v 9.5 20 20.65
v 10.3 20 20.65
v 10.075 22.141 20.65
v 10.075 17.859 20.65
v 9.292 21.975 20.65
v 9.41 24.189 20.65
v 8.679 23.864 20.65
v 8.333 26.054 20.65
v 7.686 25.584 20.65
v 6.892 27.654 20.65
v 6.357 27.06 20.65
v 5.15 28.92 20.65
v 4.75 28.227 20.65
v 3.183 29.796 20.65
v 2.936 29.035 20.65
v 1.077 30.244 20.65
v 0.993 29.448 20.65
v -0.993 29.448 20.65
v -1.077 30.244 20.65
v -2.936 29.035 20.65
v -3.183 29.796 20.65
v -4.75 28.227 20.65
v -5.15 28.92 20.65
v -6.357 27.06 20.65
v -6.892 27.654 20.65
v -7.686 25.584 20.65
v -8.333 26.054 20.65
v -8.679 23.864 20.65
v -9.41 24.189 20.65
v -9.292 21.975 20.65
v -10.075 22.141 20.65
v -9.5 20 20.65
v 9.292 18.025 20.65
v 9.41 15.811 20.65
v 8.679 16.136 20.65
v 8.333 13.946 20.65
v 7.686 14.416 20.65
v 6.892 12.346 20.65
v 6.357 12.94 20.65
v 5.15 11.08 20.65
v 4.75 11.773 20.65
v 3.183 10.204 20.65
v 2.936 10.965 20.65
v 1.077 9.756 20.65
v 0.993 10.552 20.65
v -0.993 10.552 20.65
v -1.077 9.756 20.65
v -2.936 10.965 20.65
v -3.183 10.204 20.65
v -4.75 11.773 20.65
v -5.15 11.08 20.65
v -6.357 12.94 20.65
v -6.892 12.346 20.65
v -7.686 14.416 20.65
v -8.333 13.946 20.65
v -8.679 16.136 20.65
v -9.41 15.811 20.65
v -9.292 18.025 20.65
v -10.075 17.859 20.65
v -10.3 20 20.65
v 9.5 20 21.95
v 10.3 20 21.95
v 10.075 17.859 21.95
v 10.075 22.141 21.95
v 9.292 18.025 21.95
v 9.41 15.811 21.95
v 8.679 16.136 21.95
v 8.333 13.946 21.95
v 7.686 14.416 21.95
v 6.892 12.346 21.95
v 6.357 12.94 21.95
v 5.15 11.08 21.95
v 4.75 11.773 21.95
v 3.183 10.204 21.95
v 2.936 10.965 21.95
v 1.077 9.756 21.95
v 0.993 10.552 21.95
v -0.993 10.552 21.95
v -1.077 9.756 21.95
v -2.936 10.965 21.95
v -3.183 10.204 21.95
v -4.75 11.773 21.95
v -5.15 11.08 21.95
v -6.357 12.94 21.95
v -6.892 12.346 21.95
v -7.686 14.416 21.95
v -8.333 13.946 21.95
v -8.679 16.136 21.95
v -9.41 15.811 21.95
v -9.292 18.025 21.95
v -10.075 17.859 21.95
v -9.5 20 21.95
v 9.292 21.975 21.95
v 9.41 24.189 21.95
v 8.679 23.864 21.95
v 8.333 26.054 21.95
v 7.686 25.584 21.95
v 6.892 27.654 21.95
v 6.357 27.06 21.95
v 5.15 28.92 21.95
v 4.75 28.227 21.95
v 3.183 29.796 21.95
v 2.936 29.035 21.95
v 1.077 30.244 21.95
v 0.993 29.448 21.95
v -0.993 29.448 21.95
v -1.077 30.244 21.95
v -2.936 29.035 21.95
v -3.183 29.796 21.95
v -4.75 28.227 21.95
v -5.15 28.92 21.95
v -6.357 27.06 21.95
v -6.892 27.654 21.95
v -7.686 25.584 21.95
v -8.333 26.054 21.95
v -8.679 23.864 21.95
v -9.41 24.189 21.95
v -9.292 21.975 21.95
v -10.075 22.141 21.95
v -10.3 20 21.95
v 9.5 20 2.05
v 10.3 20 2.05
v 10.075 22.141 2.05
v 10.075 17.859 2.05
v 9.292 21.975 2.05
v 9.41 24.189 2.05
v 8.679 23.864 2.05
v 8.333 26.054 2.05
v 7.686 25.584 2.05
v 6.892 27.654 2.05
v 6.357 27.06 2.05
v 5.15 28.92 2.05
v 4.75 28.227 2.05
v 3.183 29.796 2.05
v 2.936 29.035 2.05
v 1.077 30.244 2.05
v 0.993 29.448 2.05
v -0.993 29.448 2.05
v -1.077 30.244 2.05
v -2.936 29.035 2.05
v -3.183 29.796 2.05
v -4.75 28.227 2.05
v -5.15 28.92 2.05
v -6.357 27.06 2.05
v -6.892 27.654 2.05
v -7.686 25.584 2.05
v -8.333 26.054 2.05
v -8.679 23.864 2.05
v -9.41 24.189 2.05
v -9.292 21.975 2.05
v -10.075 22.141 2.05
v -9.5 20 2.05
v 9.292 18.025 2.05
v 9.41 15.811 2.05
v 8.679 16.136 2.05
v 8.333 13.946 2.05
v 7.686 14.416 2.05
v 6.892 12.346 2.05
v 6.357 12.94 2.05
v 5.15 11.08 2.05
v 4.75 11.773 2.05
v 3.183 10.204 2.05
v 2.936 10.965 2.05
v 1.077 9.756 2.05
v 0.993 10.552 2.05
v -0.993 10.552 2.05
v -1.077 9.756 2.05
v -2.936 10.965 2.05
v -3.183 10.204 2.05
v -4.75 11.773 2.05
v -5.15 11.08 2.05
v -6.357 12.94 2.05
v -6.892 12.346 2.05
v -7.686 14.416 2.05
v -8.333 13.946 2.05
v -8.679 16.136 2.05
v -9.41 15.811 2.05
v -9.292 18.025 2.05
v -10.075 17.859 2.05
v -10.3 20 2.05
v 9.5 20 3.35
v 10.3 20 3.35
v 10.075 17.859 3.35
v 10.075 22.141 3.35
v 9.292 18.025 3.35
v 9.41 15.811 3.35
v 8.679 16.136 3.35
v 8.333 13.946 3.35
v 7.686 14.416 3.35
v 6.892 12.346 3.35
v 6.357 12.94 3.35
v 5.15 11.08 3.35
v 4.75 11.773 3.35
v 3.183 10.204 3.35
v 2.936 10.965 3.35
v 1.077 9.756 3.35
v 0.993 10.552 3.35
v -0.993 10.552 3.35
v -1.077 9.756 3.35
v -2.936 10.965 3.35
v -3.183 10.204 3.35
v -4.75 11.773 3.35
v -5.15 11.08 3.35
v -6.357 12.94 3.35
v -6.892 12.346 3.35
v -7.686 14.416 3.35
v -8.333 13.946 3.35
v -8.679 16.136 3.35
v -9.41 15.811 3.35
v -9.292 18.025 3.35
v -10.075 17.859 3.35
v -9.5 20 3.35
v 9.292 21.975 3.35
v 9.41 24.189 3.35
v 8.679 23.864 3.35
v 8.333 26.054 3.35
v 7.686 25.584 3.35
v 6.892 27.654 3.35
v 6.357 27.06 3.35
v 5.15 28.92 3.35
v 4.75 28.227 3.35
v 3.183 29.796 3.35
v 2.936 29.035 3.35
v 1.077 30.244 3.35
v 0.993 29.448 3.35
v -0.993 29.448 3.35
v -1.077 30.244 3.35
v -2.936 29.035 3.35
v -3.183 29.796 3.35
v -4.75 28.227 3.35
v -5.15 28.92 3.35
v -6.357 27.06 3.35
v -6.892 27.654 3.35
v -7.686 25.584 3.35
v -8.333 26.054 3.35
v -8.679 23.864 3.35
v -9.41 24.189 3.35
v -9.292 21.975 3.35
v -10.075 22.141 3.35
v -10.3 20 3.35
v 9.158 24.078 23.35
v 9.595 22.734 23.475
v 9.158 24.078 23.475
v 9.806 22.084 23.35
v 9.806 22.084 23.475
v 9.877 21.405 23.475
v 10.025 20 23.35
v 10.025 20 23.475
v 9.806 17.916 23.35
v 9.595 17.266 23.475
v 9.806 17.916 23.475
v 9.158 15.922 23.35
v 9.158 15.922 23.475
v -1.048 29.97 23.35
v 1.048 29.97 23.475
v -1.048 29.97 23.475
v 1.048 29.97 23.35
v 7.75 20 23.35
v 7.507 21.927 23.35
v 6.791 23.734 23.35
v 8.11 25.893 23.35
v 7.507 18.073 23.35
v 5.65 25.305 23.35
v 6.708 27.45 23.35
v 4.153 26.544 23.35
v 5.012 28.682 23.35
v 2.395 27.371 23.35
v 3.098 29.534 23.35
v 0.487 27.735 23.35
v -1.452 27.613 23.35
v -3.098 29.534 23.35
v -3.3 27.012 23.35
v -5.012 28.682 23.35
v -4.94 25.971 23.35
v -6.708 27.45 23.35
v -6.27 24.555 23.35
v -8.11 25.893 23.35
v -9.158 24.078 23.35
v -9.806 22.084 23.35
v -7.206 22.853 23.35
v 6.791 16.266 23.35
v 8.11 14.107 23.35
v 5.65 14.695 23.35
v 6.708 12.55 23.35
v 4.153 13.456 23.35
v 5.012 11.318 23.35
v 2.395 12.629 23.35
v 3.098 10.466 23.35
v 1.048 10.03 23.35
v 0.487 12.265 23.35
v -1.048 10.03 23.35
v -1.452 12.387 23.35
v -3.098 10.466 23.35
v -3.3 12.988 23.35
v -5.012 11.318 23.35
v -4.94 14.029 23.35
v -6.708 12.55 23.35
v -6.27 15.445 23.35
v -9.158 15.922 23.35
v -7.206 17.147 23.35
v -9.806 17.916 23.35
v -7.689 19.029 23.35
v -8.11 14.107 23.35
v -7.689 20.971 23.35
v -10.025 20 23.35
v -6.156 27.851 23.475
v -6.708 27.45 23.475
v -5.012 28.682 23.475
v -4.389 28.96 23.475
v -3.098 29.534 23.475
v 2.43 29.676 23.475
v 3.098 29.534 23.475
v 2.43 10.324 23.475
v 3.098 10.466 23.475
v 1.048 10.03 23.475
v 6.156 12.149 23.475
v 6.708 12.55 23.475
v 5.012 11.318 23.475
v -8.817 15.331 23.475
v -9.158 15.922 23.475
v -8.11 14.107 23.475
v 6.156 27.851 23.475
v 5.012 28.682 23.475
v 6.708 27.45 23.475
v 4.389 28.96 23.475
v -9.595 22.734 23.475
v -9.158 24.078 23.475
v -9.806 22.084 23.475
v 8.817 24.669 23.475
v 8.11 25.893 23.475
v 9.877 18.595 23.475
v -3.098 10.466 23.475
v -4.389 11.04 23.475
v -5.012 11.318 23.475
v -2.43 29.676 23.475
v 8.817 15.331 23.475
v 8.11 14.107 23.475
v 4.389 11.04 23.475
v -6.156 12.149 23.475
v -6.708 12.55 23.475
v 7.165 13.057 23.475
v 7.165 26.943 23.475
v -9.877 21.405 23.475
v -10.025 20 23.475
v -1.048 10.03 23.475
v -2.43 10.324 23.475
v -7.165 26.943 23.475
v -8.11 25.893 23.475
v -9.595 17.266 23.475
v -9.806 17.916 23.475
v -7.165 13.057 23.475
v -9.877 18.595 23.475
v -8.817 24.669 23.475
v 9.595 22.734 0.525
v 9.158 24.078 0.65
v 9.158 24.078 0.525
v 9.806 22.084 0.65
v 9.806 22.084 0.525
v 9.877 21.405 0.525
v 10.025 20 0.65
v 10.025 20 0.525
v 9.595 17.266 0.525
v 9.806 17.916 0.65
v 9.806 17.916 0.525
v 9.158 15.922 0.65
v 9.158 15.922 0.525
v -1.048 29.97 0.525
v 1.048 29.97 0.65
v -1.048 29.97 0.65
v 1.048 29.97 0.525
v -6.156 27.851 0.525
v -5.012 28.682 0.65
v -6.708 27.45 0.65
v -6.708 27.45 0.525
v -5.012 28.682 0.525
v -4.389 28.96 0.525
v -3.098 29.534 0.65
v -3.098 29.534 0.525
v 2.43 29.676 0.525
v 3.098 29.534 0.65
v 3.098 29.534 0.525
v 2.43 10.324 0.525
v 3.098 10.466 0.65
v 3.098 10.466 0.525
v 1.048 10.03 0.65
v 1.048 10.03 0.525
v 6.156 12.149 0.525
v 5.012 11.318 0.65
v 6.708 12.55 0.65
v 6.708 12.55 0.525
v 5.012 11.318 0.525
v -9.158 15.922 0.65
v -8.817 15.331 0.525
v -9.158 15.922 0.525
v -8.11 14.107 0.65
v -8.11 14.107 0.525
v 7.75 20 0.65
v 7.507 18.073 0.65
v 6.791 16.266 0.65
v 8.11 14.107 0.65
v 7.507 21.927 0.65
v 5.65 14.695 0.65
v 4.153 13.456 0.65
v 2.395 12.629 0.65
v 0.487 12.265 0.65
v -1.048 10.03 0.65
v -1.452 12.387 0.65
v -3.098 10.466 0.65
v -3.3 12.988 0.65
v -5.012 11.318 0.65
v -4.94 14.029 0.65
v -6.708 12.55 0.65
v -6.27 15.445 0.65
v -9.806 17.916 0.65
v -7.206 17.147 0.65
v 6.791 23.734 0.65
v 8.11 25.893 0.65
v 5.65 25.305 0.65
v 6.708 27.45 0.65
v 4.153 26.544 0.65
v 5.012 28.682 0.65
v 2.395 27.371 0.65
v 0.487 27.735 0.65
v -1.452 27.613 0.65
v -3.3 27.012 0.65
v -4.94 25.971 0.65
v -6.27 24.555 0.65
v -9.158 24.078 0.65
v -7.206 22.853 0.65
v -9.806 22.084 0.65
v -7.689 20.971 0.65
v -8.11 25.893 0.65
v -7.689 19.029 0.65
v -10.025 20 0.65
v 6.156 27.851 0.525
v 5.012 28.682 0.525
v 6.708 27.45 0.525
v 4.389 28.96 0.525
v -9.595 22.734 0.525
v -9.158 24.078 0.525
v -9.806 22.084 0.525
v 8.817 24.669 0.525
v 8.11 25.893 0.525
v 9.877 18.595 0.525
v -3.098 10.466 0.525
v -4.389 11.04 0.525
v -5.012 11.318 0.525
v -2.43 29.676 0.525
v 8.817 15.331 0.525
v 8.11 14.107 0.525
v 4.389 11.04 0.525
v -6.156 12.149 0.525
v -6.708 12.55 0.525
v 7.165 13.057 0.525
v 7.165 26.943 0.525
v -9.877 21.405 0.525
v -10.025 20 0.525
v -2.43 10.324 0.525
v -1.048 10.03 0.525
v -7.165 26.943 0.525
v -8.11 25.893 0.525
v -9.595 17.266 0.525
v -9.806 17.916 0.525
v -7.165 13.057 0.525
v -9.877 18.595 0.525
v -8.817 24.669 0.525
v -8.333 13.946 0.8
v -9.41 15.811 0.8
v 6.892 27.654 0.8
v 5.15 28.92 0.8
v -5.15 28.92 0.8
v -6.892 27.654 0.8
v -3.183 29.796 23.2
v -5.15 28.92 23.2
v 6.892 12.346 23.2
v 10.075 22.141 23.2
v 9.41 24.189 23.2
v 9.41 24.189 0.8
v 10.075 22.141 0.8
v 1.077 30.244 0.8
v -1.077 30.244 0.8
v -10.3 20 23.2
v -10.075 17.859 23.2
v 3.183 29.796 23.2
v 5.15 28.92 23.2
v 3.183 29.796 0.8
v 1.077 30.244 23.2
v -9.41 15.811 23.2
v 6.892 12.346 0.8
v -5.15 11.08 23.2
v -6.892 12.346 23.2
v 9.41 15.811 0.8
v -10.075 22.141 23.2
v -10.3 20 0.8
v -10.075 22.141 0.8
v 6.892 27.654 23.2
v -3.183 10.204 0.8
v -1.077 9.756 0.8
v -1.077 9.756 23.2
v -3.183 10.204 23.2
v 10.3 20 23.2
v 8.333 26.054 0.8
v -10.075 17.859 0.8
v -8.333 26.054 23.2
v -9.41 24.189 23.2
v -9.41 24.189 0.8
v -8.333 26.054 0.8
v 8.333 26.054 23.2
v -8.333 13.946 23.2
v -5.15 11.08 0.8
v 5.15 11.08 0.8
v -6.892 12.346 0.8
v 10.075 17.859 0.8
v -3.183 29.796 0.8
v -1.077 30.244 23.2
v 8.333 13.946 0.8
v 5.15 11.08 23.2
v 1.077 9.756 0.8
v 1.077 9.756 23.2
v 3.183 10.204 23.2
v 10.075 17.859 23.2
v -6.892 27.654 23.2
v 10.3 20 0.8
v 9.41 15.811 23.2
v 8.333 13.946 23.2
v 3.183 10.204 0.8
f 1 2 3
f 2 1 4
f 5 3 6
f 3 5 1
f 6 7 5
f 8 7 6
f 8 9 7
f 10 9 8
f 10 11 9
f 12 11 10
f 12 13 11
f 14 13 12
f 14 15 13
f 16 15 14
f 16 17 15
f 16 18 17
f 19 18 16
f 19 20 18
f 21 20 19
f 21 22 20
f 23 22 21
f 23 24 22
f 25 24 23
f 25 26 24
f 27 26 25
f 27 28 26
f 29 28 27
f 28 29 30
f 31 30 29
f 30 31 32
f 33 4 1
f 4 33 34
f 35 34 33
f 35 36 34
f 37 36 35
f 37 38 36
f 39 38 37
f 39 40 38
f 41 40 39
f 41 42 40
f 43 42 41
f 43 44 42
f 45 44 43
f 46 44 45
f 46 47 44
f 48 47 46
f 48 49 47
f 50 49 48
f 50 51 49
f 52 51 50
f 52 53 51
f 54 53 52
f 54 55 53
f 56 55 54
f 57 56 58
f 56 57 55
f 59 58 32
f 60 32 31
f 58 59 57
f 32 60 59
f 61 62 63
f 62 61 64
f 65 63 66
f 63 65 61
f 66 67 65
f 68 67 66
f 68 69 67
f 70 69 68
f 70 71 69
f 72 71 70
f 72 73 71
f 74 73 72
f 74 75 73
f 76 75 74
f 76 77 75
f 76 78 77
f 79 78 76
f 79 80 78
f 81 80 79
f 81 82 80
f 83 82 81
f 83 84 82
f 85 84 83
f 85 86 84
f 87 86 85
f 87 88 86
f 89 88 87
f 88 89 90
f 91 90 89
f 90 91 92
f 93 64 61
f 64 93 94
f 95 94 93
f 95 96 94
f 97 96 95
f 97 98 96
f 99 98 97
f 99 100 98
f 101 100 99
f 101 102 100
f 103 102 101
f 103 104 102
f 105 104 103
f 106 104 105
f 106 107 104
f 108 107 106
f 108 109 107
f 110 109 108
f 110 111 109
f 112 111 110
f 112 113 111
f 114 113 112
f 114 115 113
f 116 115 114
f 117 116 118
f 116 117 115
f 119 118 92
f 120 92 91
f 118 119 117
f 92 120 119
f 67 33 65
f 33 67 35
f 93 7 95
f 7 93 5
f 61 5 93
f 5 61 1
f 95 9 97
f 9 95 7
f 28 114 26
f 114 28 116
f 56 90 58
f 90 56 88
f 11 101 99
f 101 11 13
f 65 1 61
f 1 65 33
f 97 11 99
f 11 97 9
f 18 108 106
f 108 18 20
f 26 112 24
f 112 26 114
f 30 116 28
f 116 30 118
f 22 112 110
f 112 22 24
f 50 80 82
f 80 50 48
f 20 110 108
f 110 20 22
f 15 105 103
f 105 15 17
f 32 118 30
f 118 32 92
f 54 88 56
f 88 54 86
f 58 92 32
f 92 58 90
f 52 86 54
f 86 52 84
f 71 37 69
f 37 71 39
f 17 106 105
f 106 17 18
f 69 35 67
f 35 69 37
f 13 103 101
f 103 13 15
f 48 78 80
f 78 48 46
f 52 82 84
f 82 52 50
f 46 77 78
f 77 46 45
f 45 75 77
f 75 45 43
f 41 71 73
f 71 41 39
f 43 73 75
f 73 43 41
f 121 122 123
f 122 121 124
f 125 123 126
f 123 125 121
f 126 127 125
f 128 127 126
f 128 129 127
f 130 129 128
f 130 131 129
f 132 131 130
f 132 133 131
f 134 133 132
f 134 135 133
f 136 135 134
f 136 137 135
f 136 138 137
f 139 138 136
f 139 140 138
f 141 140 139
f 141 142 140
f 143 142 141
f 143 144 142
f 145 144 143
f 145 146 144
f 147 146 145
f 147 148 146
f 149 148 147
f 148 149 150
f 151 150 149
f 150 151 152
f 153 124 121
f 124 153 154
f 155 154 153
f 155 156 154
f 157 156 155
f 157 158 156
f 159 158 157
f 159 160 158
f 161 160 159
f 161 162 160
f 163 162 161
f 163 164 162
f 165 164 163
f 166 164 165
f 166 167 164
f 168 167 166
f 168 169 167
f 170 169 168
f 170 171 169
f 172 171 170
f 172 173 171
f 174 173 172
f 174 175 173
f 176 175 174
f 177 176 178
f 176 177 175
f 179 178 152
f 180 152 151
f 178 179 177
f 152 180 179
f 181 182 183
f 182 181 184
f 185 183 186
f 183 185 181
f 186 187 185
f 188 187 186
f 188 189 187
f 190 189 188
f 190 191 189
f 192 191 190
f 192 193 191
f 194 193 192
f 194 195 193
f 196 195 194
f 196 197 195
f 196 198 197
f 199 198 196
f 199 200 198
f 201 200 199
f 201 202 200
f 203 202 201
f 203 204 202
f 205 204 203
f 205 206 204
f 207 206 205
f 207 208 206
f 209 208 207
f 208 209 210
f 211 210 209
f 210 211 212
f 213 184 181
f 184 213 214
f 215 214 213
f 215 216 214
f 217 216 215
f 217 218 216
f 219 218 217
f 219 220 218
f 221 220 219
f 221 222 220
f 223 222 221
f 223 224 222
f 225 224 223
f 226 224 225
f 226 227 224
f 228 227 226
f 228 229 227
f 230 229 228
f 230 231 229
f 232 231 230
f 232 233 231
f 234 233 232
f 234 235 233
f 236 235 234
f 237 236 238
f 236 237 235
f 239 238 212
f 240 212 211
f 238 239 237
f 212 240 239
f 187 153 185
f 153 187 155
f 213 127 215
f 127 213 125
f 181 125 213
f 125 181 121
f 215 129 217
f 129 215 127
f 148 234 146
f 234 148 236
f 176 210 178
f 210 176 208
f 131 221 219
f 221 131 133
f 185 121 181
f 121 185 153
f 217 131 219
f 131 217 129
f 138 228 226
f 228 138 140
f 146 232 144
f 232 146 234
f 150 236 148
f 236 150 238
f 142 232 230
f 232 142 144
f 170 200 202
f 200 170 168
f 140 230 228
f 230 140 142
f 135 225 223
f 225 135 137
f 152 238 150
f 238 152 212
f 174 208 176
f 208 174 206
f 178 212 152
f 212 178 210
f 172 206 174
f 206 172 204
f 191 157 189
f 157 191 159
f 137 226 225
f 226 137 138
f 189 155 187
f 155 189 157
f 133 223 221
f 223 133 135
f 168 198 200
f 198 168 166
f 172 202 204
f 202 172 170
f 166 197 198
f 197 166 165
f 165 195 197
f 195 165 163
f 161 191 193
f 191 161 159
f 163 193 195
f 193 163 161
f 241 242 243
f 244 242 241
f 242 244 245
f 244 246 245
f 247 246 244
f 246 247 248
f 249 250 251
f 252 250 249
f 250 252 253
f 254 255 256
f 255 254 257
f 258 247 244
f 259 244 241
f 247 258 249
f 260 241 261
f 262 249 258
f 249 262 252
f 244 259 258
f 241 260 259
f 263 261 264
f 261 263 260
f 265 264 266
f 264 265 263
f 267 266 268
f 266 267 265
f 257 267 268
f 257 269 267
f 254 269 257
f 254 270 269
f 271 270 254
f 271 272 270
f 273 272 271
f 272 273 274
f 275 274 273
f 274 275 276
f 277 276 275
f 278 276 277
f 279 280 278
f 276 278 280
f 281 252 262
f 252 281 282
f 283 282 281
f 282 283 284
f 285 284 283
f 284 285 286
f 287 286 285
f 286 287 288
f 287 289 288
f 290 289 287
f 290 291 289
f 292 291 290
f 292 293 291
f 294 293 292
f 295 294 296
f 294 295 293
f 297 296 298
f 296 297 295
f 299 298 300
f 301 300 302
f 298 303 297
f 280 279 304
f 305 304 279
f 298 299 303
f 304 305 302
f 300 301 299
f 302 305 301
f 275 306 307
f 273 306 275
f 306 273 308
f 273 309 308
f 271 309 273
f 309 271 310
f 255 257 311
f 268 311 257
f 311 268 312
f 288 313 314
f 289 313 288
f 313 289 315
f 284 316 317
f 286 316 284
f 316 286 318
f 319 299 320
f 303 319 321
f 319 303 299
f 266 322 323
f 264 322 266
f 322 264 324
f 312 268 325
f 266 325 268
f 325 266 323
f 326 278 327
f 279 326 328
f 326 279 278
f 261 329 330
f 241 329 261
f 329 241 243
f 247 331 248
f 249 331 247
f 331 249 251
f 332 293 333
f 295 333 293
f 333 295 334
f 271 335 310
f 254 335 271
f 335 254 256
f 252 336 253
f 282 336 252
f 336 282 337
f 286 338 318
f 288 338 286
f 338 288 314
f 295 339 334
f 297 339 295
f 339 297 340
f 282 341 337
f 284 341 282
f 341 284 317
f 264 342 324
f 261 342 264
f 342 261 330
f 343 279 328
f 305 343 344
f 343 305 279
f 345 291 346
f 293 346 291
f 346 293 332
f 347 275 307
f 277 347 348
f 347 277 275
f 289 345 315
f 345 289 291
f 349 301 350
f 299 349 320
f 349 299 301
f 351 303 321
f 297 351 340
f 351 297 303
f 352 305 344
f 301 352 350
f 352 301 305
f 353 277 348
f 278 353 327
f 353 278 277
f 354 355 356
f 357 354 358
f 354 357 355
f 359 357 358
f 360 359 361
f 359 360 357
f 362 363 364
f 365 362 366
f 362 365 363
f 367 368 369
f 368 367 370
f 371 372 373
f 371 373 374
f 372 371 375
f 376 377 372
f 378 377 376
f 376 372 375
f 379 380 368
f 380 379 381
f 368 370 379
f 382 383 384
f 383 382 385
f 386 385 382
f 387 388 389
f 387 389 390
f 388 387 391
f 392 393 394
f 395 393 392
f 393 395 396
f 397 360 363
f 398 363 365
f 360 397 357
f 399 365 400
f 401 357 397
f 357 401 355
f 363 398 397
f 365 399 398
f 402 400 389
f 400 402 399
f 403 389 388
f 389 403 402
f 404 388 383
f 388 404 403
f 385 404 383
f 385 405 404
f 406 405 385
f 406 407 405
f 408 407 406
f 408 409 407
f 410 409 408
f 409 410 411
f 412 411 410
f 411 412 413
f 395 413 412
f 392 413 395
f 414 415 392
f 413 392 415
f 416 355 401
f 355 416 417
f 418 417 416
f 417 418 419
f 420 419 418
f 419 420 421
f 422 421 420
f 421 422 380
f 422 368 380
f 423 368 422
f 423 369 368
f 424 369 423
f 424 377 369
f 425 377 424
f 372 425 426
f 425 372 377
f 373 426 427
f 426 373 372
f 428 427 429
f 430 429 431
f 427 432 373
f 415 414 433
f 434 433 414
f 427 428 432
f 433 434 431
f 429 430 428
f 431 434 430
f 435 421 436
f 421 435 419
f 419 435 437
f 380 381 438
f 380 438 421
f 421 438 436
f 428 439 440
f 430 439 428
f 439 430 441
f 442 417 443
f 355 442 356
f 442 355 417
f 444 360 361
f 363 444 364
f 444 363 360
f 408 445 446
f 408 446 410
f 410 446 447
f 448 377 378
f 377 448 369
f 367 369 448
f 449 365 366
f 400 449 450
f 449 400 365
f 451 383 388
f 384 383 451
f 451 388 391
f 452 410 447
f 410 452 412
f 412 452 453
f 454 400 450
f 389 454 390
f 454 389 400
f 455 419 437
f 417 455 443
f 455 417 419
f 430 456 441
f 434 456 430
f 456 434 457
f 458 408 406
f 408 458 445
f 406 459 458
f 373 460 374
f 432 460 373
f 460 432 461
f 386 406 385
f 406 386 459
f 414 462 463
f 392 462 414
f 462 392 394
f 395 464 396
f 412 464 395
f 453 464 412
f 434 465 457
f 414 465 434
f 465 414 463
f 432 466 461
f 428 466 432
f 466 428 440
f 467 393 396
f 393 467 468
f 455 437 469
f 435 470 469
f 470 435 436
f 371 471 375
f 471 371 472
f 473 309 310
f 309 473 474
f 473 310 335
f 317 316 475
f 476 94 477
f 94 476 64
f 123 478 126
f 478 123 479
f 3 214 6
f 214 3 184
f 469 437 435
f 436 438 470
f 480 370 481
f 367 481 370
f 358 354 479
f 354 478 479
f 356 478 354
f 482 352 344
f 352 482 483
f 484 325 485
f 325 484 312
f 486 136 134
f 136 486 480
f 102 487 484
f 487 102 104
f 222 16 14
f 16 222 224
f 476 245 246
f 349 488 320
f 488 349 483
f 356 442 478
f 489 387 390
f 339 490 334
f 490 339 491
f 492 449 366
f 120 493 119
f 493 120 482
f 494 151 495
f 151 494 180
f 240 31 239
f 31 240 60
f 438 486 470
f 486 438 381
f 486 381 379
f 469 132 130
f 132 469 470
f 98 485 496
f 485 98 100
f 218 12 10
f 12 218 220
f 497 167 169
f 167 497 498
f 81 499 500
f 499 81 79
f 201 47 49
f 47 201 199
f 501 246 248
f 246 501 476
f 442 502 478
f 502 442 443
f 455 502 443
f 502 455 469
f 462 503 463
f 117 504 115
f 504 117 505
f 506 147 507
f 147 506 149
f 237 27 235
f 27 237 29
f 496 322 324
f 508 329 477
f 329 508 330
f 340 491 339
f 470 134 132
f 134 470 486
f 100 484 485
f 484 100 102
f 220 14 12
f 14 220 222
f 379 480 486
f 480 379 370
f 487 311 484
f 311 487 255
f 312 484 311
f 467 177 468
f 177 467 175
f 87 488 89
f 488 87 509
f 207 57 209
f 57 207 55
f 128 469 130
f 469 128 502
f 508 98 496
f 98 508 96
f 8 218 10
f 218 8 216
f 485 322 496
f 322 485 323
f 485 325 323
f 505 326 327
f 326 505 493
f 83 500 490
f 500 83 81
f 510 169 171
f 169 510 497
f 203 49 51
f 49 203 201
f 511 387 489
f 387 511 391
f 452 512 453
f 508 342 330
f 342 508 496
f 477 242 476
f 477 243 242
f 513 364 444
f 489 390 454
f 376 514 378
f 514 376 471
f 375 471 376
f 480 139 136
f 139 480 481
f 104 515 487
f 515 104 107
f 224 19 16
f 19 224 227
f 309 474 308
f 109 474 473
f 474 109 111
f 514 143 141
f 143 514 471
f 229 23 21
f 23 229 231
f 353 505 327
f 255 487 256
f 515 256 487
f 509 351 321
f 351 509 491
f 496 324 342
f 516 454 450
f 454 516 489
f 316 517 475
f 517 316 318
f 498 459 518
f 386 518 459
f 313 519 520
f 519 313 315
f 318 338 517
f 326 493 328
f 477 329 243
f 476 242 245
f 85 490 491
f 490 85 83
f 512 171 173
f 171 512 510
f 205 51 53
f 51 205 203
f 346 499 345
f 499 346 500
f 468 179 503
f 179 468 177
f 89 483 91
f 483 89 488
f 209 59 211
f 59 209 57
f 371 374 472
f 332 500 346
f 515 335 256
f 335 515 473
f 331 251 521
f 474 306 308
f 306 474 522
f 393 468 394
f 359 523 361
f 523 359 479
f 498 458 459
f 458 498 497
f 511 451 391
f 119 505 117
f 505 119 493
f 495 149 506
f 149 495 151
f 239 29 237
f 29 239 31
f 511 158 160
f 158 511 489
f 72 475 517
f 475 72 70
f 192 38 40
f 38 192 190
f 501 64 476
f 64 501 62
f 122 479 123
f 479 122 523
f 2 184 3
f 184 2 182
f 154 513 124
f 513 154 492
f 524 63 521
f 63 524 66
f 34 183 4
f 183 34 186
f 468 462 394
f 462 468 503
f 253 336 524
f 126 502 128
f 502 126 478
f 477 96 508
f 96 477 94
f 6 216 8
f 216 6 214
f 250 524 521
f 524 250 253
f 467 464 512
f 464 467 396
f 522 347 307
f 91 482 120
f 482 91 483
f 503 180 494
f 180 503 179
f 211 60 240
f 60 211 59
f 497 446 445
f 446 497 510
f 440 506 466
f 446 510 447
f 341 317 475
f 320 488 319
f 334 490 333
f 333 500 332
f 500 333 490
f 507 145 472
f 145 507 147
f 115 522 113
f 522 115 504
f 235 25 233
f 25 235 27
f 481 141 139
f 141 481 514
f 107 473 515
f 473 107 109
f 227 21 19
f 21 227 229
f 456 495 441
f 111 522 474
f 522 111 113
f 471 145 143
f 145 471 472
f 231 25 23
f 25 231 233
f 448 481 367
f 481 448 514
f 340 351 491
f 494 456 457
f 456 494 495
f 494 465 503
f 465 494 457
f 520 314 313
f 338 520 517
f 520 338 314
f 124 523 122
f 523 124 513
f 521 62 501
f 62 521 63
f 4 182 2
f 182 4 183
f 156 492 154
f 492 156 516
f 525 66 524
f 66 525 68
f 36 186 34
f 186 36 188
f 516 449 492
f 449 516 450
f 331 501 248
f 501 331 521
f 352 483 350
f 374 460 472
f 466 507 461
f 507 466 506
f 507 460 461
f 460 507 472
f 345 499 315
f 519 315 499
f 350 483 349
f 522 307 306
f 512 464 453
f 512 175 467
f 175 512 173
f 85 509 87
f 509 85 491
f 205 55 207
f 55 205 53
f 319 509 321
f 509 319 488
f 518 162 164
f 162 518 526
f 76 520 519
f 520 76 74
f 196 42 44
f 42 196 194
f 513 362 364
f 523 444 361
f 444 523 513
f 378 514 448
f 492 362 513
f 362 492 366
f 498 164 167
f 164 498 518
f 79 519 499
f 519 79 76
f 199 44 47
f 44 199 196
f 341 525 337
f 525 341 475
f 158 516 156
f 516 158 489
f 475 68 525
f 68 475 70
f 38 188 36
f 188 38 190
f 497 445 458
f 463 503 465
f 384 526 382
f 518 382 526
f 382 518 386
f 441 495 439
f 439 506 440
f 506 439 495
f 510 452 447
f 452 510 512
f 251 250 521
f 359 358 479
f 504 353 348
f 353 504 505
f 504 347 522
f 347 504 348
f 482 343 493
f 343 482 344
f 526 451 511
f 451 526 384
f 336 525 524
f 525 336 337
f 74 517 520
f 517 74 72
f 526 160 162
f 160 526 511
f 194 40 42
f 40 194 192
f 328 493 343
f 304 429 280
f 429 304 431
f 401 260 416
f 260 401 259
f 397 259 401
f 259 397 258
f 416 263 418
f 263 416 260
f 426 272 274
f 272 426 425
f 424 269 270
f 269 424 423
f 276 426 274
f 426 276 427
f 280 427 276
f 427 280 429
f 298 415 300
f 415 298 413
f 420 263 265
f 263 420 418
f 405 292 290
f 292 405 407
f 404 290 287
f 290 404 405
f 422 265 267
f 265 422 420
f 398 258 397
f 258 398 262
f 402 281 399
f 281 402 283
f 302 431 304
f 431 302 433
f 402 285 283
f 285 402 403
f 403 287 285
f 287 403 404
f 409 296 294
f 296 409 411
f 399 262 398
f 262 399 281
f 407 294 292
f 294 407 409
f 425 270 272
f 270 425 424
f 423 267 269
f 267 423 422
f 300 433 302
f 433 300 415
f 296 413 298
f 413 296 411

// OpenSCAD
// Open SCAD model of linear Bearing LM-8-UU & KB-12-WW

//     LM-8-UU        KB-12-WW
//	D_Int =  8.0	D_Int = 12.0
//	D_Ext = 15.0	D_Ext = 22.0
//	D_1   = 14.3	D_1   = 21.0
//	L     = 24.0	L     = 32.0
//	W     =  1.1	W     =  1.3
//	B     = 17.5	B     = 22.9



module groove(d1, d2, w) {
	difference() {
		cylinder(r=d1/2+1, h=w, center=true);
		cylinder(r=d2/2  , h=w, center=true);
	}
}

module lb(D_Int=8, D_Ext=15, D_1=14.3, L=24, W=1.1, B=17.5) {
chamf = D_Ext - D_1;
	difference() {
		hull() {
			cylinder(r=D_Ext/2, h=L-chamf, center=true);
			cylinder(r=D_1  /2, h=L      , center=true);
		}
		cylinder(r=D_Int/2, h=L+2    , center=true);
		translate([0, 0, B/2-W/2]) groove(D_Ext, D_1, W);
		translate([0, 0,-B/2+W/2]) groove(D_Ext, D_1, W);
		translate([0, 0,     L/2]) groove(D_Ext-(D_Ext-D_Int)/2, 1, W);
		translate([0, 0,    -L/2]) groove(D_Ext-(D_Ext-D_Int)/2, 1, W);
	}
}


module linear_bearing(linear_bearing_type) {
	if(linear_bearing_type == "LM-8-UU") {   //LM-8-UU
		lb(D_Int=8.5, D_Ext=11.8, D_1=10, L=24, W=1.1, B=15.5);
	}
	else {
		if(linear_bearing_type == "KB-12-WW") {   //KB-12-WW
			lb(D_Int=15.5, D_Ext=20.6, D_1=19, L=24, W=1.3, B=19.9);
		}
	}
}


//translate([0,  0, 12]) linear_bearing("LM-8-UU" );
translate([0, 20, 12]) linear_bearing("KB-12-WW");
